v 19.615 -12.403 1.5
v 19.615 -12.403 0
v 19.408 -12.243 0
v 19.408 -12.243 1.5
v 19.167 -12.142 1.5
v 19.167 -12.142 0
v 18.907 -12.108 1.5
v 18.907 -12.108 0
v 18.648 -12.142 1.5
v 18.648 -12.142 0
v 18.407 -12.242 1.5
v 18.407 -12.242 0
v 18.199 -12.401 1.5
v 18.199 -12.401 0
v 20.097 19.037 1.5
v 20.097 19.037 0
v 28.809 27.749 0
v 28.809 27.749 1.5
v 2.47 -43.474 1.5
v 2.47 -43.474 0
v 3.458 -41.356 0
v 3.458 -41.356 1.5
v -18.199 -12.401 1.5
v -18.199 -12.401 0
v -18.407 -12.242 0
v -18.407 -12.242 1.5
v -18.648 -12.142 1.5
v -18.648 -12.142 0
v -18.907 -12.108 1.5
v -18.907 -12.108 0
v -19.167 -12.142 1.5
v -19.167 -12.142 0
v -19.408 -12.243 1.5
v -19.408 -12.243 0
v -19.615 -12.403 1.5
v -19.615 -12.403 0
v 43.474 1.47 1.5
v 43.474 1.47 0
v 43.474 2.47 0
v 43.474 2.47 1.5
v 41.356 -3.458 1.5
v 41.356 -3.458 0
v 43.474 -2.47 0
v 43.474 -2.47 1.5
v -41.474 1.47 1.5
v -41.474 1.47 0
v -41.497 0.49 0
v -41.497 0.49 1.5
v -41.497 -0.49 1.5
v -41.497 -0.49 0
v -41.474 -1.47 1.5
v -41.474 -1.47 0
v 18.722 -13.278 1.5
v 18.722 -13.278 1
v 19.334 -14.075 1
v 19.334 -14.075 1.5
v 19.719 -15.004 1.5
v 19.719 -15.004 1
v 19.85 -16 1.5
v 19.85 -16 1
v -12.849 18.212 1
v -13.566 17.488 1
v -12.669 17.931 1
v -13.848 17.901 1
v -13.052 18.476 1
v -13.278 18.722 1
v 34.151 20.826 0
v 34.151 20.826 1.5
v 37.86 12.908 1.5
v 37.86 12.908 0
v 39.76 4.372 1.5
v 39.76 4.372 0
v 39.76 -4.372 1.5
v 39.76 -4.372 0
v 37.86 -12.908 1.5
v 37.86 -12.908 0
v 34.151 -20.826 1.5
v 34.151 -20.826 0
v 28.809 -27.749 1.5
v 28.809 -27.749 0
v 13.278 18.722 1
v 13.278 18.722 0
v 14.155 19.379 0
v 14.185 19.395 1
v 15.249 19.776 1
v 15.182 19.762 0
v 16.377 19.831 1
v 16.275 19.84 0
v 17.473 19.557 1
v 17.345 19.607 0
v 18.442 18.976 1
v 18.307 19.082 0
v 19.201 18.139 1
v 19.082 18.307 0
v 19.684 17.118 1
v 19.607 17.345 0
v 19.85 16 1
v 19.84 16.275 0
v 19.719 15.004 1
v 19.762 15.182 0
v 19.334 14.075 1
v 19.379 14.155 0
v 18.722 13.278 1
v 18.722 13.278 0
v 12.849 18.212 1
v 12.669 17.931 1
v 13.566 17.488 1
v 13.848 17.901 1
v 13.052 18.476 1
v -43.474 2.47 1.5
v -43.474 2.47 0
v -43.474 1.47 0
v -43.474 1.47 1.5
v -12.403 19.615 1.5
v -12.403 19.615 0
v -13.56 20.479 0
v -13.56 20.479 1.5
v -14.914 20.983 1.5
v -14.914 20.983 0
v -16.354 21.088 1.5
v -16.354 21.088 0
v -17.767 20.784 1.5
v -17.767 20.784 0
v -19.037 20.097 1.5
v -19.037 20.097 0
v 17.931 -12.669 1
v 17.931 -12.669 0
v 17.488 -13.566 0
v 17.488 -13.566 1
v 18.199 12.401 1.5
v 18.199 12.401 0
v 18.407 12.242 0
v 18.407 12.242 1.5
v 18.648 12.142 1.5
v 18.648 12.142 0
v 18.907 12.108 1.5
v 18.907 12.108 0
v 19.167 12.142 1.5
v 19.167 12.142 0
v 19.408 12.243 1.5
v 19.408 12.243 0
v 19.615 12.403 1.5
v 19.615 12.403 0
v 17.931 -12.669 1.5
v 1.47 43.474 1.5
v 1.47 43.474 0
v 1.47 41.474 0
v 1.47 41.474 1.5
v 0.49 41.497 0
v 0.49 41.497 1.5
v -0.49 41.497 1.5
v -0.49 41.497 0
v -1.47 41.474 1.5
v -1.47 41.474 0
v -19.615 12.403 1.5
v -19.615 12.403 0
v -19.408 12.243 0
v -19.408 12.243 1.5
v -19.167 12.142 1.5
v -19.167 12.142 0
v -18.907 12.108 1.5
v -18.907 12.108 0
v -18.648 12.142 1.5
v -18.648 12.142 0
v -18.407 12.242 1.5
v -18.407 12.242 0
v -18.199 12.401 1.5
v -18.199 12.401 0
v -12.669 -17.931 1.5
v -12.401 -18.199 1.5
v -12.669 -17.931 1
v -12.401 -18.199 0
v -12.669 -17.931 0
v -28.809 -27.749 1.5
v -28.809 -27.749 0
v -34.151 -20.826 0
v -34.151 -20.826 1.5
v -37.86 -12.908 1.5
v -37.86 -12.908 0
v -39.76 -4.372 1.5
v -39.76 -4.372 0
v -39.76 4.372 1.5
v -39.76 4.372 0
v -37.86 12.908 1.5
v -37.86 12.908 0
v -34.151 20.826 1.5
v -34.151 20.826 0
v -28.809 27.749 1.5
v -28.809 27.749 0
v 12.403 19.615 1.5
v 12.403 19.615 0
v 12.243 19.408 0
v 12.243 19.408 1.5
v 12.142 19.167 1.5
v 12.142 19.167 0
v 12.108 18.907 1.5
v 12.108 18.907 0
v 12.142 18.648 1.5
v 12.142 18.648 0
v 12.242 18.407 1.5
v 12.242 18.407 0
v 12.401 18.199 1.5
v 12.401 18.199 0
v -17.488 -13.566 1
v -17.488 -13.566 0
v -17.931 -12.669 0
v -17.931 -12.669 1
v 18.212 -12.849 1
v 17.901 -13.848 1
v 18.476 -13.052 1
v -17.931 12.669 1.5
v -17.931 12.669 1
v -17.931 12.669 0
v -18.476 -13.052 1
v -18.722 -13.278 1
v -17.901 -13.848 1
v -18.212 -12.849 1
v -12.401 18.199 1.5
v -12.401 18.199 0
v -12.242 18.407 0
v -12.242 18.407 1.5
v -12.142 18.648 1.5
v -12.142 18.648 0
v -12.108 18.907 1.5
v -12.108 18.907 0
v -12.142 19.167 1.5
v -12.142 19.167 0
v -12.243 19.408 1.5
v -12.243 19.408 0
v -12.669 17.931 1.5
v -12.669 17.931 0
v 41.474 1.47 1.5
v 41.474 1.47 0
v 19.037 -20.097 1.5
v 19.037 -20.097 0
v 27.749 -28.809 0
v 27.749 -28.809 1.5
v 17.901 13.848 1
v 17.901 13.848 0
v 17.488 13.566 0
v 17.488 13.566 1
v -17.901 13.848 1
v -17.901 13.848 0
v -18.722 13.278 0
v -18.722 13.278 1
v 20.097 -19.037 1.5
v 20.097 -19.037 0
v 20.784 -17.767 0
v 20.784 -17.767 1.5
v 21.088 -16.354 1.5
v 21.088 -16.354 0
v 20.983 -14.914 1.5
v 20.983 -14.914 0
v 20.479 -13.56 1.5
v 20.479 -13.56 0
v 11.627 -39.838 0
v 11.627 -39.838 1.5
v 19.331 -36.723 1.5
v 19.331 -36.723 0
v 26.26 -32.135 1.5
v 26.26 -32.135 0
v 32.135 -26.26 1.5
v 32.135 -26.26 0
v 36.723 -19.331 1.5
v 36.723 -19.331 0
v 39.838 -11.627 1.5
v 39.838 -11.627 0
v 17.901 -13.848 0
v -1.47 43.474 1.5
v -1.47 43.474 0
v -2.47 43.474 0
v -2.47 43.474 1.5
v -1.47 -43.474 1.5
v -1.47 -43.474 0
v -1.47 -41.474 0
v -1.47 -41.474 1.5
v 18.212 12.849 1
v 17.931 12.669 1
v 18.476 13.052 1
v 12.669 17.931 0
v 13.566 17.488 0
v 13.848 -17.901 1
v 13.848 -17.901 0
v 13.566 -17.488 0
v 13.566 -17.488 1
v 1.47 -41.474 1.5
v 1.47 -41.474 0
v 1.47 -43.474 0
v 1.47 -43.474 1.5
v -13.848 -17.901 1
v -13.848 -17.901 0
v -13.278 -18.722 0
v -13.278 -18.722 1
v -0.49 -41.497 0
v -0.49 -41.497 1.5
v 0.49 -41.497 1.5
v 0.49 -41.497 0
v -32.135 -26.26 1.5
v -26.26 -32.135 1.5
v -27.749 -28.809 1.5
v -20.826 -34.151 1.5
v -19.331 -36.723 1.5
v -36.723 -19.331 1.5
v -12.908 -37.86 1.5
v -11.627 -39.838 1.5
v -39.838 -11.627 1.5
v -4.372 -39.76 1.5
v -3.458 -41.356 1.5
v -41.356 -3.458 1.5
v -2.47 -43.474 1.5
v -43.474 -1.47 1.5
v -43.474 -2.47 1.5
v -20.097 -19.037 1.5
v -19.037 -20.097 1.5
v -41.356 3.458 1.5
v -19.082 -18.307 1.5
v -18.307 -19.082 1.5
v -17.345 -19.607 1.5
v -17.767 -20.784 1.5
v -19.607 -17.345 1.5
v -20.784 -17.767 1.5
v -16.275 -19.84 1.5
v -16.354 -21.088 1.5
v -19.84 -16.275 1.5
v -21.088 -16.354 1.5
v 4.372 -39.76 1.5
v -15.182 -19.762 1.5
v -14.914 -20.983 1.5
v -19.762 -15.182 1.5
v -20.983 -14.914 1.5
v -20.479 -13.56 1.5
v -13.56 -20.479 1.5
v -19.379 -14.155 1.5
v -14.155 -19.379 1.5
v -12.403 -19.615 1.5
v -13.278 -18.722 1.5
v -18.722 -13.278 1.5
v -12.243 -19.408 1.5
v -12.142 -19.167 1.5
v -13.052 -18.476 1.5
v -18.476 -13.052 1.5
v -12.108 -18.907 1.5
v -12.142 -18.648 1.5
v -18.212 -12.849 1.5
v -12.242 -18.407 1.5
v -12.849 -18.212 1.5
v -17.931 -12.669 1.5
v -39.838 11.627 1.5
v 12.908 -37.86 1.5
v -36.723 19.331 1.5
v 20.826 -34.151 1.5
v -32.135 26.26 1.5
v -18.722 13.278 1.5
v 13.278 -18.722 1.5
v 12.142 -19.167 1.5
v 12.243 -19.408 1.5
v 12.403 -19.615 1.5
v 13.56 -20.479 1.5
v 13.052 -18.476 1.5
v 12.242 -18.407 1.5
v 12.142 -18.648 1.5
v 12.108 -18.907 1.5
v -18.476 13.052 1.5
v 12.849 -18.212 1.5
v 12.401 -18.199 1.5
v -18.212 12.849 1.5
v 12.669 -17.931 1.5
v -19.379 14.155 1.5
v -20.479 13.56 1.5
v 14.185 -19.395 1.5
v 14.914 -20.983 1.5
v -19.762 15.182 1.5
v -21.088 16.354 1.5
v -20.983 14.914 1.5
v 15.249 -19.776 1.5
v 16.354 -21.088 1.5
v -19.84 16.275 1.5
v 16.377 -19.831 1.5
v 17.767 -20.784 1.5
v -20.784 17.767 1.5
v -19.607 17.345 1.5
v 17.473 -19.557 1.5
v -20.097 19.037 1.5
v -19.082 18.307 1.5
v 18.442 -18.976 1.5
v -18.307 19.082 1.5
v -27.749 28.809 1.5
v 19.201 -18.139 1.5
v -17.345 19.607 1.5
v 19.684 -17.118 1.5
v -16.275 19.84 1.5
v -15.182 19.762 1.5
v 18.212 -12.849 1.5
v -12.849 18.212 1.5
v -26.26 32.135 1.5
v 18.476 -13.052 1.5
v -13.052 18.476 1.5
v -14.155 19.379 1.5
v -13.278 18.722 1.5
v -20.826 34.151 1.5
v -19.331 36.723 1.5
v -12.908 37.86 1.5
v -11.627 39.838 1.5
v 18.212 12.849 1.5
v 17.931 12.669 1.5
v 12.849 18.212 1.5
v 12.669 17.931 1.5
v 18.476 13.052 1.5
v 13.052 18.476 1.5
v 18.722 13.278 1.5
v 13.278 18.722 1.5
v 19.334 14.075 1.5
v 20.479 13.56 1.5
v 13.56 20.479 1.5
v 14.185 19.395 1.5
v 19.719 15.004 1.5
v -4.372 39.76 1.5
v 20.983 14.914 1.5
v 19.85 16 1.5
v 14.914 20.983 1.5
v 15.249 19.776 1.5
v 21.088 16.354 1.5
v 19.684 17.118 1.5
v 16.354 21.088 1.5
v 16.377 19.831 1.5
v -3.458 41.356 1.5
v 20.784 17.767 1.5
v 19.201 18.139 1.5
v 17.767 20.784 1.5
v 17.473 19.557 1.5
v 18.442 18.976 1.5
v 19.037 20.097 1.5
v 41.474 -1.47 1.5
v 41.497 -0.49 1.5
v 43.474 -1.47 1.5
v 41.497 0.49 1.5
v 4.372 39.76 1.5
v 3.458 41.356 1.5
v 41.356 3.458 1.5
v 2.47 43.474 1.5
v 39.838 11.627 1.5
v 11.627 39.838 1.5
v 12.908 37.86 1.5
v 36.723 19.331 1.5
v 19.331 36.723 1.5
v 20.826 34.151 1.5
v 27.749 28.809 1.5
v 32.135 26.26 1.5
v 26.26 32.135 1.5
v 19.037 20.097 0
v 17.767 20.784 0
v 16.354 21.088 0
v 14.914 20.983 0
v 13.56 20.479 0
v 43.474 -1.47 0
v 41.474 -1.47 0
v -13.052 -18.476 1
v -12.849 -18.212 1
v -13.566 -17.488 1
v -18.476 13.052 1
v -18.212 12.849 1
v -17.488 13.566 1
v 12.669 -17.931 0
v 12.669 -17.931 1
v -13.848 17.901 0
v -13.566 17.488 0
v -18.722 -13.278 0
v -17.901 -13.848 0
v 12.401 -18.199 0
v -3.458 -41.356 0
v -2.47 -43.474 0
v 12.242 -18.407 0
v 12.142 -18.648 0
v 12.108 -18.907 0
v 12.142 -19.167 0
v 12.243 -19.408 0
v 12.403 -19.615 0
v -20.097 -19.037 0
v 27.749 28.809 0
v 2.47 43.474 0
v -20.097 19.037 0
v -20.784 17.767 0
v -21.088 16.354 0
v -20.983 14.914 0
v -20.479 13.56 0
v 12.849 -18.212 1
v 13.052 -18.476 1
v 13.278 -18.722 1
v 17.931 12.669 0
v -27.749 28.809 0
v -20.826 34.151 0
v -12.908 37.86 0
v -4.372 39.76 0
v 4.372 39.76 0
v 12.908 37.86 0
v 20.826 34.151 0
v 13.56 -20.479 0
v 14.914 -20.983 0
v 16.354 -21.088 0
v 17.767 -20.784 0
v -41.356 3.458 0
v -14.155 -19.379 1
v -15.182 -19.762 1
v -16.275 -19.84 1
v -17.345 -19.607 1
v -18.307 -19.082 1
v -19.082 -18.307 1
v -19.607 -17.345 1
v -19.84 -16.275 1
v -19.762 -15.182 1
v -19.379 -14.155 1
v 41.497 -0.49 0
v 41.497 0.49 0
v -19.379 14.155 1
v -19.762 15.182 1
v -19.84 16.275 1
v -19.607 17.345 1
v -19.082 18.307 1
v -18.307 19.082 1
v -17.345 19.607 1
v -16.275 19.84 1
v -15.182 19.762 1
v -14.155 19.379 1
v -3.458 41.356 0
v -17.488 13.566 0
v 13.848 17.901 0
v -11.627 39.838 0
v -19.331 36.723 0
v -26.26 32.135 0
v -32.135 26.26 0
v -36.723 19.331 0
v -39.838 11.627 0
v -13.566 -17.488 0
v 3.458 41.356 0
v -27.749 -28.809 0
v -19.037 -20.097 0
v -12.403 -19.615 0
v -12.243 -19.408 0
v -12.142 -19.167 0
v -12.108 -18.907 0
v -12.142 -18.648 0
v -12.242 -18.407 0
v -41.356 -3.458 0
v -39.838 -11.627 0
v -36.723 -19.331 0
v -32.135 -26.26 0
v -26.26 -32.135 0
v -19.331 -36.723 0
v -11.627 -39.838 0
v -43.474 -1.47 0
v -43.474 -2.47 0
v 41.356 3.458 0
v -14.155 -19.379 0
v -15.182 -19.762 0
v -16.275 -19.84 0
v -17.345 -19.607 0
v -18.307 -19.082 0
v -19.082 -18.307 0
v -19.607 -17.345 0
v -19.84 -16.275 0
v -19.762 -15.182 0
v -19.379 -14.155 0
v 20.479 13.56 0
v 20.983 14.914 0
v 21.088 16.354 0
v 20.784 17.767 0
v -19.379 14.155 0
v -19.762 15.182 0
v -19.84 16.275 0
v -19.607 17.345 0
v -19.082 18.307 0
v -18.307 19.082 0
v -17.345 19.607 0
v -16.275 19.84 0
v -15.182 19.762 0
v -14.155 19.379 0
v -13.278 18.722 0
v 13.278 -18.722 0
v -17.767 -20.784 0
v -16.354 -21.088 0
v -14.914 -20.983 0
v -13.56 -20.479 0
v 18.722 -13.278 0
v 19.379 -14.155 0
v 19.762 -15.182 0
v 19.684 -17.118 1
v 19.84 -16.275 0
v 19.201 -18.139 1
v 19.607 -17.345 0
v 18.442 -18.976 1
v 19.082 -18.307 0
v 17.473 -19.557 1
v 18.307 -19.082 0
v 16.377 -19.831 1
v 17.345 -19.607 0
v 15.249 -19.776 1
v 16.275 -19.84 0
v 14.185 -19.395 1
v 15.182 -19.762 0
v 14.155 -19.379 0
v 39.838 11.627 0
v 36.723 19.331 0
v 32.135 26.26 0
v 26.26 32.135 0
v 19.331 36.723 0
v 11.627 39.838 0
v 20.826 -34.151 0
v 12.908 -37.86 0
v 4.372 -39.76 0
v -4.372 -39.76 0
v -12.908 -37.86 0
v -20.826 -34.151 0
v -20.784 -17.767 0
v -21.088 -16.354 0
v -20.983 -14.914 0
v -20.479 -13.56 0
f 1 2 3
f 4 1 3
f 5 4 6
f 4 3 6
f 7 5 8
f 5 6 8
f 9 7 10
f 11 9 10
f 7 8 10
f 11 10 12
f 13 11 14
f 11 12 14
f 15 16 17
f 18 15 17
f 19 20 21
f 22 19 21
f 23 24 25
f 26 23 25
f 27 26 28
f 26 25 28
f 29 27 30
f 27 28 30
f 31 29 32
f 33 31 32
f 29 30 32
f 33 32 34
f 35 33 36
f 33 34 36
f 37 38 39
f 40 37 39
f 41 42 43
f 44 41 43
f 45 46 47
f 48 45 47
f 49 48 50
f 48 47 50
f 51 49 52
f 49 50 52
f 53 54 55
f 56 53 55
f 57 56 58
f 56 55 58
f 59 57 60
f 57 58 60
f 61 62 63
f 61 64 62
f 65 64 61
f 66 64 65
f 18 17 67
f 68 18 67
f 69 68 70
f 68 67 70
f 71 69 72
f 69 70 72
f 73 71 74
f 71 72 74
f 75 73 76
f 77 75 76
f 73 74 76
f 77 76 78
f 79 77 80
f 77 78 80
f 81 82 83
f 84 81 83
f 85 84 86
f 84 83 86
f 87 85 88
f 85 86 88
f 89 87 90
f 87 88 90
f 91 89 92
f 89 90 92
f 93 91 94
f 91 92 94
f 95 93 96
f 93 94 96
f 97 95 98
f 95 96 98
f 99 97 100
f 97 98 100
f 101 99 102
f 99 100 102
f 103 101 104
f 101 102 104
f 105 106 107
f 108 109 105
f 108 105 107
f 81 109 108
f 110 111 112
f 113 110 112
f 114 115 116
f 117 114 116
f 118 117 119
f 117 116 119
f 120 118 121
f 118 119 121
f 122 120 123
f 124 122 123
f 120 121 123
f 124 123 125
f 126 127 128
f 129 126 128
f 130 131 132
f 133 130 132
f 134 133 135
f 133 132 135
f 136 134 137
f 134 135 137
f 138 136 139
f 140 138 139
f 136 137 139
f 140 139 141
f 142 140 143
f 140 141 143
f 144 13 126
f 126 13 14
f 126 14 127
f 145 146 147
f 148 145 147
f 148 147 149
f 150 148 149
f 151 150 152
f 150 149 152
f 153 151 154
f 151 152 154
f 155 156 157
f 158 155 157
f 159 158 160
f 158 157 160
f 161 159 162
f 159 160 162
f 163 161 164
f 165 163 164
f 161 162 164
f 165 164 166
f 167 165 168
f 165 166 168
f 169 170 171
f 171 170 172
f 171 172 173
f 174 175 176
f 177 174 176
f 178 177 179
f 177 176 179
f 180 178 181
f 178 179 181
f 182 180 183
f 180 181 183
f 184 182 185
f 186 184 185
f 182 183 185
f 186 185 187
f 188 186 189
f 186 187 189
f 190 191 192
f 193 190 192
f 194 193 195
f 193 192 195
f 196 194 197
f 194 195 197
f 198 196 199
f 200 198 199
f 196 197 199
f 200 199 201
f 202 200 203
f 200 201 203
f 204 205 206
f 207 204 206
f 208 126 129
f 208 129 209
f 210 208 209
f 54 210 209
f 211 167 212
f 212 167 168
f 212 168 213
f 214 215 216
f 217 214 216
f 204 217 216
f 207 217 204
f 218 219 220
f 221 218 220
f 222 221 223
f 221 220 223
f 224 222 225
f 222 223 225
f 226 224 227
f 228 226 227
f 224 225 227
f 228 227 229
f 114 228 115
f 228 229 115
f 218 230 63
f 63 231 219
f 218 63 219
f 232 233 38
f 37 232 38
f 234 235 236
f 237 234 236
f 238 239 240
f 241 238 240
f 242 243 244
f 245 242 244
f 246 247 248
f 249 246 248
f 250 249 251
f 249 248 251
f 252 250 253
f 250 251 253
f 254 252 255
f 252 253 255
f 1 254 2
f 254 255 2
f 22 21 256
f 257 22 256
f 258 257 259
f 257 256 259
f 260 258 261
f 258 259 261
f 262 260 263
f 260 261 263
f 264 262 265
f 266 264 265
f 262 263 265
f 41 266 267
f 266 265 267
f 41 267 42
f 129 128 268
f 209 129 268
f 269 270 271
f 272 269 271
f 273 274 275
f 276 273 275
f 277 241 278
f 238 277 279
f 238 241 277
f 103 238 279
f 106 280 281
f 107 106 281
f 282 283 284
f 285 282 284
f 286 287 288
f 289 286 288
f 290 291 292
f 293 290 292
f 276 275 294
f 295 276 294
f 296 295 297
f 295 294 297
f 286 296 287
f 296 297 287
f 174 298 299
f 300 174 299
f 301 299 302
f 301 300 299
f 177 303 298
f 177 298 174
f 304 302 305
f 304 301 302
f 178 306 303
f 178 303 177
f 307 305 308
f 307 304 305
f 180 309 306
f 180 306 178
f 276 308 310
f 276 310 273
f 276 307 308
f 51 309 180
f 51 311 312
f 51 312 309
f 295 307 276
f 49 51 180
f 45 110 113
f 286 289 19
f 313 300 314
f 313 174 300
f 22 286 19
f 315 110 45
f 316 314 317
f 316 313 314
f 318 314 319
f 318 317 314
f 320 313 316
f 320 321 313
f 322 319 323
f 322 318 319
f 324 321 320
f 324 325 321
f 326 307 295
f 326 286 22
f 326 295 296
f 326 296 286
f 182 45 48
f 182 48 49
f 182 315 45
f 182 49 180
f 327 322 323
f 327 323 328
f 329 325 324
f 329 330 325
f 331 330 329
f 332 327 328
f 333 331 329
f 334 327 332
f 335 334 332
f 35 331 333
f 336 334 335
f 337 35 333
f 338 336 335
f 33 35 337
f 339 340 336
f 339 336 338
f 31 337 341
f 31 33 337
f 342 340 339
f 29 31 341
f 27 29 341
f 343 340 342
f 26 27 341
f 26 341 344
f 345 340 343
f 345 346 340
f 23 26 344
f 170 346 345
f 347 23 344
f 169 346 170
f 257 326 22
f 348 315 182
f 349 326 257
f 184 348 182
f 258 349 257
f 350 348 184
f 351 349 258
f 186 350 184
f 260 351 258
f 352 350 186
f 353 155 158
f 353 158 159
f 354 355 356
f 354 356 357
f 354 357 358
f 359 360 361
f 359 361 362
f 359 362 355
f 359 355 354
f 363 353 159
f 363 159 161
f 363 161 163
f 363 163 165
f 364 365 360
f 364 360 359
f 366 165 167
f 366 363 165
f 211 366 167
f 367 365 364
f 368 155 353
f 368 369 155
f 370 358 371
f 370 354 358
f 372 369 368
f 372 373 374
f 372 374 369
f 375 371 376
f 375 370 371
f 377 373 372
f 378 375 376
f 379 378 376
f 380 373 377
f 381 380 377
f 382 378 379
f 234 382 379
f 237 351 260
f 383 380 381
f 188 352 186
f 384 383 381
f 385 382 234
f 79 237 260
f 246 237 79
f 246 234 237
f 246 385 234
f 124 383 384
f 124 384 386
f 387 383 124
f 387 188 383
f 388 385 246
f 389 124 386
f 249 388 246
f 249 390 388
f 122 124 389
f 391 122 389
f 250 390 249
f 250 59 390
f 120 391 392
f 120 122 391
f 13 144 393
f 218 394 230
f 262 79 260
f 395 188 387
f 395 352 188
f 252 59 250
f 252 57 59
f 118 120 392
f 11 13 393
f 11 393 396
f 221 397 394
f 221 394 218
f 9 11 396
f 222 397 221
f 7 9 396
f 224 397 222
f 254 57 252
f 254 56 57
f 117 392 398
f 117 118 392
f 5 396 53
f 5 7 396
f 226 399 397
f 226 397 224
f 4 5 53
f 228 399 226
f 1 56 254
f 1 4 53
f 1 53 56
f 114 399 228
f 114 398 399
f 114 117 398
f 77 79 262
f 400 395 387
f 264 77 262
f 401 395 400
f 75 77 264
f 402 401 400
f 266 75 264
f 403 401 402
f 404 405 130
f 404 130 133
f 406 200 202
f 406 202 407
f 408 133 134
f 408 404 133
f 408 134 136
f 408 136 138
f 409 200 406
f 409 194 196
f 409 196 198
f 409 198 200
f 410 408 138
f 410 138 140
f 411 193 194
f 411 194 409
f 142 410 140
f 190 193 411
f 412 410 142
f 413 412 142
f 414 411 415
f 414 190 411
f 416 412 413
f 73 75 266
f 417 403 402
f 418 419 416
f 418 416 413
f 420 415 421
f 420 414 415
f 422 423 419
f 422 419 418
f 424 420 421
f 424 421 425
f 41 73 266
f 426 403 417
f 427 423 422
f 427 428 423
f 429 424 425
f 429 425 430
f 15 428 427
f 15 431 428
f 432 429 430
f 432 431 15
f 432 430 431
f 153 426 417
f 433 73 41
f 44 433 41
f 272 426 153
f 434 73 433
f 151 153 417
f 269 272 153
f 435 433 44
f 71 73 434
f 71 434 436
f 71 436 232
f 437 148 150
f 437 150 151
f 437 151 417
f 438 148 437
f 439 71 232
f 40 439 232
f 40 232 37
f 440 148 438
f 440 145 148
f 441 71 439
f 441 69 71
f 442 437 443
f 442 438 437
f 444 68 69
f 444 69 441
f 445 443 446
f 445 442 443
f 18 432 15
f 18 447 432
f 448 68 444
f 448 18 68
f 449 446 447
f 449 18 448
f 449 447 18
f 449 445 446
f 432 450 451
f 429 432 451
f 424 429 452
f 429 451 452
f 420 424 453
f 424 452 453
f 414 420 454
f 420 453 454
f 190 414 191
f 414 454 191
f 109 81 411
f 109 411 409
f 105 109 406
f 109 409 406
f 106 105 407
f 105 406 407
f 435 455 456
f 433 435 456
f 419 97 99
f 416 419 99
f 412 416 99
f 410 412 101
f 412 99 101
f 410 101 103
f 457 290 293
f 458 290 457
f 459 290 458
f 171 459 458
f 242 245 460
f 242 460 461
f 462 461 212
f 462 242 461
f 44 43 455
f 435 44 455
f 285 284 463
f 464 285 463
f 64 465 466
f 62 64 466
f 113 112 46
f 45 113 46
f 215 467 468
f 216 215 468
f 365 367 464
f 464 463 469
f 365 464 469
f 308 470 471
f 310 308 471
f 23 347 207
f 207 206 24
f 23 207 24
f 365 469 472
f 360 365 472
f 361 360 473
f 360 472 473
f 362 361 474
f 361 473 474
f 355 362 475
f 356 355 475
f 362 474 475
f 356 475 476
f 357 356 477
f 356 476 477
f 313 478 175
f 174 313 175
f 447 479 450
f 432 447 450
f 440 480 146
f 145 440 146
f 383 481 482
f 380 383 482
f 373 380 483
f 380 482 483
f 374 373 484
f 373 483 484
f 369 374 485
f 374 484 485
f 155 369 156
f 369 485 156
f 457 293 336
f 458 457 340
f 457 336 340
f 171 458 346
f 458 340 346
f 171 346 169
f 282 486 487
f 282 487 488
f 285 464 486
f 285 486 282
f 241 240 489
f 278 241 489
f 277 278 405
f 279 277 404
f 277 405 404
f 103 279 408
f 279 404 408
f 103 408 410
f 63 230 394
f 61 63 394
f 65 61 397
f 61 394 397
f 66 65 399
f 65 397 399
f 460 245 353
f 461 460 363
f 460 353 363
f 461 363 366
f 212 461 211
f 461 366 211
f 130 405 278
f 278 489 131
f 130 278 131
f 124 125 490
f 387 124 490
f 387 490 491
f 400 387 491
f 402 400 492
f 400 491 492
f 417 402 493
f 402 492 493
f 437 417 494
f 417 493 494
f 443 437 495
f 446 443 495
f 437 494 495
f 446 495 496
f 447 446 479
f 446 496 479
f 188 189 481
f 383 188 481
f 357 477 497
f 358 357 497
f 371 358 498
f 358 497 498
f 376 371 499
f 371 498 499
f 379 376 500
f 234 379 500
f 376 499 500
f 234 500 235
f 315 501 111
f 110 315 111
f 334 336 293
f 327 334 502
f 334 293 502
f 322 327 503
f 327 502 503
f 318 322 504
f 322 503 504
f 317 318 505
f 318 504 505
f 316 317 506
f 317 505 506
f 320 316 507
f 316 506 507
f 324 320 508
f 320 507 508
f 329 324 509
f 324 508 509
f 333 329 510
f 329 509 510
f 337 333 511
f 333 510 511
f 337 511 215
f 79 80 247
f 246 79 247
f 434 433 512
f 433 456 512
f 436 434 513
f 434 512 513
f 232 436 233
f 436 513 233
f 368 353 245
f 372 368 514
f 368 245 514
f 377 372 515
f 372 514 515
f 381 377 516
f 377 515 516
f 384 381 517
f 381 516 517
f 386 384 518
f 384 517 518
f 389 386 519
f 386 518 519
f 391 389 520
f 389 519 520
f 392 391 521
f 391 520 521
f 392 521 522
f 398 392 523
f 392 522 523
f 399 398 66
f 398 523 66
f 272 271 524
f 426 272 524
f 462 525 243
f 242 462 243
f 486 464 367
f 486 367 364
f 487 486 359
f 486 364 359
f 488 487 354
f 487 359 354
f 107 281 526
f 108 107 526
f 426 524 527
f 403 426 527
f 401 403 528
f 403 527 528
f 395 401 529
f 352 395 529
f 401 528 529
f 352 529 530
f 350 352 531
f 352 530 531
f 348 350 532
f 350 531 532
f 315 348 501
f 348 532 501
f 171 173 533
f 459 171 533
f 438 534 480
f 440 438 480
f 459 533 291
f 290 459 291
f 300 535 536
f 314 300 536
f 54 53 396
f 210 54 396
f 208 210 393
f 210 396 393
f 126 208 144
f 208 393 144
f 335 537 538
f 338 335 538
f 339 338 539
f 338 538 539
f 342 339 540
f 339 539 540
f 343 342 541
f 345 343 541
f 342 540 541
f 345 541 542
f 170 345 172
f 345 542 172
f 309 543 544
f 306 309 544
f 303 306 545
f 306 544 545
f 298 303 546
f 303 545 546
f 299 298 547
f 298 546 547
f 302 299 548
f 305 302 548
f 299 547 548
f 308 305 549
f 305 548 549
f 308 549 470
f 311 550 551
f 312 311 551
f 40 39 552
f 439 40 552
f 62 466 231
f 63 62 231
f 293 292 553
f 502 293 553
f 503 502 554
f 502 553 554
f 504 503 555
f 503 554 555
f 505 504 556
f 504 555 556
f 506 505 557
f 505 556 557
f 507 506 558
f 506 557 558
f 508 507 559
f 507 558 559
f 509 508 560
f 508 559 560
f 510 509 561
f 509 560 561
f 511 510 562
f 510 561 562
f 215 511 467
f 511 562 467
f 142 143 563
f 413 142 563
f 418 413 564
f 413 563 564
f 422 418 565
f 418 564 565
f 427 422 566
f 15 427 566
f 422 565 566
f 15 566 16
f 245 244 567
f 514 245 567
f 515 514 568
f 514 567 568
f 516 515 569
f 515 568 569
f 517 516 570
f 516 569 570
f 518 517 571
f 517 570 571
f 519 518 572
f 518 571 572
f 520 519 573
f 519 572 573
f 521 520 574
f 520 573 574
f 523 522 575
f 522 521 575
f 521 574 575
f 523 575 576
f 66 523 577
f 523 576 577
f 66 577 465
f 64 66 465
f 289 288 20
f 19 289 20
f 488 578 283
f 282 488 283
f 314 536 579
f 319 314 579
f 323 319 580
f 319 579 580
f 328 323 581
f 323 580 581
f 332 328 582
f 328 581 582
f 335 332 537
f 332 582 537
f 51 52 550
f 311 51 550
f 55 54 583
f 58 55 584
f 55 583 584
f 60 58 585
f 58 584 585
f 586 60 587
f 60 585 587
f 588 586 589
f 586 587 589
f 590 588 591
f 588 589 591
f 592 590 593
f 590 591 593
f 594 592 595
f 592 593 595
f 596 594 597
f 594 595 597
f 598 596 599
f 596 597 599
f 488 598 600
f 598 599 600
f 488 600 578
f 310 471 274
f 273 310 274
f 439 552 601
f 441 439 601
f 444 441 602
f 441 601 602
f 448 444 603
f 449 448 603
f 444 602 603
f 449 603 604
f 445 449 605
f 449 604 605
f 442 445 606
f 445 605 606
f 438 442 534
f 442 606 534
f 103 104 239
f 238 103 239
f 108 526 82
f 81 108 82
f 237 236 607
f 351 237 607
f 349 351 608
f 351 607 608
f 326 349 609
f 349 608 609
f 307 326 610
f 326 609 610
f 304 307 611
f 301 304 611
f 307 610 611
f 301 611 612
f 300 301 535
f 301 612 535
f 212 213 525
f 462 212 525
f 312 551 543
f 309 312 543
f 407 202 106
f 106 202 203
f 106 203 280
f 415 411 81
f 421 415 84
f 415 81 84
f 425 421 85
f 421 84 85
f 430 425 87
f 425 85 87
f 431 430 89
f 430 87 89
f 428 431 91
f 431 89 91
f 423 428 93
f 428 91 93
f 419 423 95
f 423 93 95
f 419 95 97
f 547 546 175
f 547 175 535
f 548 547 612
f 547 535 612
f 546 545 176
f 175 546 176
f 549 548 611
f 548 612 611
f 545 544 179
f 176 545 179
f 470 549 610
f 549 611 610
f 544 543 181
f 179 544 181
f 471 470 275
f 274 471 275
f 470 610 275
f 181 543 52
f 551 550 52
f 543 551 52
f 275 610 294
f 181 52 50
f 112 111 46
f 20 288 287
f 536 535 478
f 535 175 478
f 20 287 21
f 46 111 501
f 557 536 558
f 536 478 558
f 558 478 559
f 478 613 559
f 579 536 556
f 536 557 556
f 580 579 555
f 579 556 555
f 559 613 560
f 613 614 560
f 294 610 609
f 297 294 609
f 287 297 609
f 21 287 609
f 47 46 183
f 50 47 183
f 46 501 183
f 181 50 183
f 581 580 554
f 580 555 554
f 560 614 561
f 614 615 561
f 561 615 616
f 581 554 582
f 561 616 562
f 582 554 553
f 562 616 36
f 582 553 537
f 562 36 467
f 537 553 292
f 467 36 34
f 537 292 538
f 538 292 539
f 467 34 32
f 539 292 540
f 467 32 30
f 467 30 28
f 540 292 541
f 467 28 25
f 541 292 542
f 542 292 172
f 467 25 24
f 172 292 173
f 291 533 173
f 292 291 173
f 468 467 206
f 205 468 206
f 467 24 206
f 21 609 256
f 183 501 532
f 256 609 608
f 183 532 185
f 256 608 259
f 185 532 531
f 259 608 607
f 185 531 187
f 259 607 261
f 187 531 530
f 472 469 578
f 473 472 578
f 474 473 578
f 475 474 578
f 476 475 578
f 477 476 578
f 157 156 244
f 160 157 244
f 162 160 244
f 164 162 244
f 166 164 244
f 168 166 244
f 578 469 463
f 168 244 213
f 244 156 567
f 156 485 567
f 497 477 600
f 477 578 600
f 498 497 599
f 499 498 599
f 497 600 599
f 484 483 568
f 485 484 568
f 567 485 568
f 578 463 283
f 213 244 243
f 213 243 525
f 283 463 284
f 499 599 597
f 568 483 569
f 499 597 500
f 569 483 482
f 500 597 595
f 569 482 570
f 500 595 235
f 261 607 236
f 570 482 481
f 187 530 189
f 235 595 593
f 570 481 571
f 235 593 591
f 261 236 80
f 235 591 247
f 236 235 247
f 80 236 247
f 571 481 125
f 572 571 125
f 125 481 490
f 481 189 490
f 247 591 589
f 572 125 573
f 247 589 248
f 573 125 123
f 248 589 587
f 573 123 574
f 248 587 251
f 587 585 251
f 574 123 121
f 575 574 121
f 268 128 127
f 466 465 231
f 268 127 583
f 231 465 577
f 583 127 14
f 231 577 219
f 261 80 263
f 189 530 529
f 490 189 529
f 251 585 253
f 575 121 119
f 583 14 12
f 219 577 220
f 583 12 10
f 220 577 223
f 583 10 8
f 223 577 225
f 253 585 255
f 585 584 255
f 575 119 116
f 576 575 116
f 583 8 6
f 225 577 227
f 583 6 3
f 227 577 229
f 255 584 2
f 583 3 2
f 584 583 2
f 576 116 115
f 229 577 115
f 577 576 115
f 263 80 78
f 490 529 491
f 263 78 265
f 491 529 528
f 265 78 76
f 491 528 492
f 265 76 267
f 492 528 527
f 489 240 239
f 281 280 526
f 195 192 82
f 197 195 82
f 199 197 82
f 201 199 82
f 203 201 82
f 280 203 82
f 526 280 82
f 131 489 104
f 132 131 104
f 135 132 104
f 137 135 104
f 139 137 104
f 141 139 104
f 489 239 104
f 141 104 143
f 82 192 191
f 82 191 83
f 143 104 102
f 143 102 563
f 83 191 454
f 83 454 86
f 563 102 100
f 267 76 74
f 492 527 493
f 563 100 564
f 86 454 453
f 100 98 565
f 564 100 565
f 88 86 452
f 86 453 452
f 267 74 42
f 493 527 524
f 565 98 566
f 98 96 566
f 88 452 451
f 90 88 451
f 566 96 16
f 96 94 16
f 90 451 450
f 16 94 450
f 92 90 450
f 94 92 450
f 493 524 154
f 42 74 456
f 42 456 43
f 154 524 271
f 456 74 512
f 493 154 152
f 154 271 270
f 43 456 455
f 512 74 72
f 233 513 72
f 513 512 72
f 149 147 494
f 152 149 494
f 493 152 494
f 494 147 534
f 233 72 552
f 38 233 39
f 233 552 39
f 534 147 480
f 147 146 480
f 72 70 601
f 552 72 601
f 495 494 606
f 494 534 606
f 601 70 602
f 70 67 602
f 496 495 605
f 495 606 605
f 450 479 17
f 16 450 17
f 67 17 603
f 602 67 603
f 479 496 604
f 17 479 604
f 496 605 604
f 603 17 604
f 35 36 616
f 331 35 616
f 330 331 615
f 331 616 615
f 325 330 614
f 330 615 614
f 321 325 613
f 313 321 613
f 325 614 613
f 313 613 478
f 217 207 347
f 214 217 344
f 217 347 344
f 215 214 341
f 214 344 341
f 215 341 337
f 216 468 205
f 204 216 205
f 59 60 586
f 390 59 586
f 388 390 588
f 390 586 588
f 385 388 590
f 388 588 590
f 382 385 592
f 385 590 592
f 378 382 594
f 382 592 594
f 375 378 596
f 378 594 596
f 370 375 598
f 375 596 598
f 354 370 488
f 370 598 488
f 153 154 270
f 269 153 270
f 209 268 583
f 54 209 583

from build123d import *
from build123d import SkipClean  # not in build123d's __all__

# Parameters (mm, degrees)
F1_R     = 41.5
F2_DEPTH = 1.5
F3_R     = 3.85
F4_DEPTH = 0.5
F6_DEPTH = 1.5


with BuildPart() as f2:
    # F1 (on face) → F2 (new body)
    with BuildSketch(Plane.XY):
        Circle(F1_R)
        with BuildLine():
            ThreePointArc((-28.8093051541, -27.7493051541), (-40, 0), (-28.8093051541, 27.7493051541))
            Line((-28.8093051541, 27.7493051541), (-20.0970856452, 19.0370856452))
            ThreePointArc((-20.0970856452, 19.0370856452), (-21.086593154, 15.6304460992), (-19.6150738914, 12.4026063935))
            ThreePointArc((-19.6150738914, 12.4026063935), (-18.9074615459, 12.1079784401), (-18.1991290923, 12.4008709077))
            Line((-18.1991290923, 12.4008709077), (-17.9308268662, 12.6691731338))
            Line((-17.9308268662, 12.6691731338), (-17.4883090065, 13.565932825))
            Line((-17.4883090065, 13.565932825), (-17.9010595127, 13.8481331433))
            Line((-17.9010595127, 13.8481331433), (-18.7223611076, 13.2776388924))
            ThreePointArc((-18.7223611076, 13.2776388924), (-18.7223611076, 18.7223611076), (-13.2776388924, 18.7223611076))
            Line((-13.2776388924, 18.7223611076), (-13.8477912725, 17.9008221471))
            Line((-13.8477912725, 17.9008221471), (-13.5657589526, 17.4879568294))
            Line((-13.5657589526, 17.4879568294), (-12.6691731338, 17.9308268662))
            Line((-12.6691731338, 17.9308268662), (-12.4008709077, 18.1991290923))
            ThreePointArc((-12.4008709077, 18.1991290923), (-12.1079784401, 18.9074615459), (-12.4026063935, 19.6150738914))
            ThreePointArc((-12.4026063935, 19.6150738914), (-15.6304460992, 21.086593154), (-19.0370856452, 20.0970856452))
            Line((-19.0370856452, 20.0970856452), (-27.7493051541, 28.8093051541))
            ThreePointArc((-27.7493051541, 28.8093051541), (0, 40), (27.7493051541, 28.8093051541))
            Line((27.7493051541, 28.8093051541), (19.0370856452, 20.0970856452))
            ThreePointArc((19.0370856452, 20.0970856452), (15.6304460992, 21.086593154), (12.4026063935, 19.6150738914))
            ThreePointArc((12.4026063935, 19.6150738914), (12.1079784401, 18.9074615459), (12.4008709077, 18.1991290923))
            Line((12.4008709077, 18.1991290923), (12.6691731338, 17.9308268662))
            Line((12.6691731338, 17.9308268662), (13.565932825, 17.4883090065))
            Line((13.565932825, 17.4883090065), (13.8481331433, 17.9010595127))
            Line((13.8481331433, 17.9010595127), (13.2776388924, 18.7223611076))
            ThreePointArc((13.2776388924, 18.7223611076), (18.7223611076, 18.7223611076), (18.7223611076, 13.2776388924))
            Line((18.7223611076, 13.2776388924), (17.9008221471, 13.8477912725))
            Line((17.9008221471, 13.8477912725), (17.4879568294, 13.5657589526))
            Line((17.4879568294, 13.5657589526), (17.9308268662, 12.6691731338))
            Line((17.9308268662, 12.6691731338), (18.1991290923, 12.4008709077))
            ThreePointArc((18.1991290923, 12.4008709077), (18.9074615459, 12.1079784401), (19.6150738914, 12.4026063935))
            ThreePointArc((19.6150738914, 12.4026063935), (21.086593154, 15.6304460992), (20.0970856452, 19.0370856452))
            Line((20.0970856452, 19.0370856452), (28.8093051541, 27.7493051541))
            ThreePointArc((28.8093051541, 27.7493051541), (40, 0), (28.8093051541, -27.7493051541))
            Line((28.8093051541, -27.7493051541), (20.0970856452, -19.0370856452))
            ThreePointArc((20.0970856452, -19.0370856452), (21.086593154, -15.6304460992), (19.6150738914, -12.4026063935))
            ThreePointArc((19.6150738914, -12.4026063935), (18.9074615459, -12.1079784401), (18.1991290923, -12.4008709077))
            Line((18.1991290923, -12.4008709077), (17.9308268662, -12.6691731338))
            Line((17.9308268662, -12.6691731338), (17.4883090065, -13.565932825))
            Line((17.4883090065, -13.565932825), (17.9010595127, -13.8481331433))
            Line((17.9010595127, -13.8481331433), (18.7223611076, -13.2776388924))
            ThreePointArc((18.7223611076, -13.2776388924), (18.7223611076, -18.7223611076), (13.2776388924, -18.7223611076))
            Line((13.2776388924, -18.7223611076), (13.8477912725, -17.9008221471))
            Line((13.8477912725, -17.9008221471), (13.5657589526, -17.4879568294))
            Line((13.5657589526, -17.4879568294), (12.6691731338, -17.9308268662))
            Line((12.6691731338, -17.9308268662), (12.4008709077, -18.1991290923))
            ThreePointArc((12.4008709077, -18.1991290923), (12.1079784401, -18.9074615459), (12.4026063935, -19.6150738914))
            ThreePointArc((12.4026063935, -19.6150738914), (15.6304460992, -21.086593154), (19.0370856452, -20.0970856452))
            Line((19.0370856452, -20.0970856452), (27.7493051541, -28.8093051541))
            ThreePointArc((27.7493051541, -28.8093051541), (0, -40), (-27.7493051541, -28.8093051541))
            Line((-27.7493051541, -28.8093051541), (-19.0370856452, -20.0970856452))
            ThreePointArc((-19.0370856452, -20.0970856452), (-15.6304460992, -21.086593154), (-12.4026063935, -19.6150738914))
            ThreePointArc((-12.4026063935, -19.6150738914), (-12.1079784401, -18.9074615459), (-12.4008709077, -18.1991290923))
            Line((-12.4008709077, -18.1991290923), (-12.6691731338, -17.9308268662))
            Line((-12.6691731338, -17.9308268662), (-13.565932825, -17.4883090065))
            Line((-13.565932825, -17.4883090065), (-13.8481331433, -17.9010595127))
            Line((-13.8481331433, -17.9010595127), (-13.2776388924, -18.7223611076))
            ThreePointArc((-13.2776388924, -18.7223611076), (-18.7223611076, -18.7223611076), (-18.7223611076, -13.2776388924))
            Line((-18.7223611076, -13.2776388924), (-17.9008221471, -13.8477912725))
            Line((-17.9008221471, -13.8477912725), (-17.4879568294, -13.5657589526))
            Line((-17.4879568294, -13.5657589526), (-17.9308268662, -12.6691731338))
            Line((-17.9308268662, -12.6691731338), (-18.1991290923, -12.4008709077))
            ThreePointArc((-18.1991290923, -12.4008709077), (-18.9074615459, -12.1079784401), (-19.6150738914, -12.4026063935))
            ThreePointArc((-19.6150738914, -12.4026063935), (-21.086593154, -15.6304460992), (-20.0970856452, -19.0370856452))
            Line((-20.0970856452, -19.0370856452), (-28.8093051541, -27.7493051541))
        make_face(mode=Mode.SUBTRACT)
    extrude(amount=F2_DEPTH)

    # F3 (on face) → F4 (cut)
    with BuildSketch(Plane.XY.offset(1.5)):
        with Locations((-16, 16)):
            Circle(F3_R)
        with Locations((-16, -16)):
            Circle(F3_R)
        with Locations((16, -16)):
            Circle(F3_R)
        with Locations((16, 16)):
            Circle(F3_R)
    with SkipClean():  # cleaning this boolean's faces spoils the solid; the shape is the same uncleaned
        extrude(amount=-F4_DEPTH, mode=Mode.SUBTRACT)

    # F5 (on Top) → F6 (join)
    with BuildSketch(Plane.XY):
        Polygon((-1.47, 41.4739568886), (-1.47, 43.4739568886), (-2.47, 43.4739568886), (-3.4575279787, 41.3557190758), align=None)
        Polygon((2.47, 43.4739568886), (1.47, 43.4739568886), (1.47, 41.4739568886), (3.4575279787, 41.3557190758), align=None)
        Polygon((-43.4739568886, 2.47), (-43.4739568886, 1.47), (-41.4739568886, 1.47), (-41.3557190758, 3.4575279787), align=None)
        Polygon((-41.4739568886, -1.47), (-43.4739568886, -1.47), (-43.4739568886, -2.47), (-41.3557190758, -3.4575279787), align=None)
        Polygon((-2.47, -43.4739568886), (-1.47, -43.4739568886), (-1.47, -41.4739568886), (-3.4575279787, -41.3557190758), align=None)
        Polygon((1.47, -41.4739568886), (1.47, -43.4739568886), (2.47, -43.4739568886), (3.4575279787, -41.3557190758), align=None)
        Polygon((43.4739568886, -2.47), (43.4739568886, -1.47), (41.4739568886, -1.47), (41.3557190758, -3.4575279787), align=None)
        Polygon((41.4739568886, 1.47), (43.4739568886, 1.47), (43.4739568886, 2.47), (41.3557190758, 3.4575279787), align=None)
    extrude(amount=F6_DEPTH)


solid = f2.part
